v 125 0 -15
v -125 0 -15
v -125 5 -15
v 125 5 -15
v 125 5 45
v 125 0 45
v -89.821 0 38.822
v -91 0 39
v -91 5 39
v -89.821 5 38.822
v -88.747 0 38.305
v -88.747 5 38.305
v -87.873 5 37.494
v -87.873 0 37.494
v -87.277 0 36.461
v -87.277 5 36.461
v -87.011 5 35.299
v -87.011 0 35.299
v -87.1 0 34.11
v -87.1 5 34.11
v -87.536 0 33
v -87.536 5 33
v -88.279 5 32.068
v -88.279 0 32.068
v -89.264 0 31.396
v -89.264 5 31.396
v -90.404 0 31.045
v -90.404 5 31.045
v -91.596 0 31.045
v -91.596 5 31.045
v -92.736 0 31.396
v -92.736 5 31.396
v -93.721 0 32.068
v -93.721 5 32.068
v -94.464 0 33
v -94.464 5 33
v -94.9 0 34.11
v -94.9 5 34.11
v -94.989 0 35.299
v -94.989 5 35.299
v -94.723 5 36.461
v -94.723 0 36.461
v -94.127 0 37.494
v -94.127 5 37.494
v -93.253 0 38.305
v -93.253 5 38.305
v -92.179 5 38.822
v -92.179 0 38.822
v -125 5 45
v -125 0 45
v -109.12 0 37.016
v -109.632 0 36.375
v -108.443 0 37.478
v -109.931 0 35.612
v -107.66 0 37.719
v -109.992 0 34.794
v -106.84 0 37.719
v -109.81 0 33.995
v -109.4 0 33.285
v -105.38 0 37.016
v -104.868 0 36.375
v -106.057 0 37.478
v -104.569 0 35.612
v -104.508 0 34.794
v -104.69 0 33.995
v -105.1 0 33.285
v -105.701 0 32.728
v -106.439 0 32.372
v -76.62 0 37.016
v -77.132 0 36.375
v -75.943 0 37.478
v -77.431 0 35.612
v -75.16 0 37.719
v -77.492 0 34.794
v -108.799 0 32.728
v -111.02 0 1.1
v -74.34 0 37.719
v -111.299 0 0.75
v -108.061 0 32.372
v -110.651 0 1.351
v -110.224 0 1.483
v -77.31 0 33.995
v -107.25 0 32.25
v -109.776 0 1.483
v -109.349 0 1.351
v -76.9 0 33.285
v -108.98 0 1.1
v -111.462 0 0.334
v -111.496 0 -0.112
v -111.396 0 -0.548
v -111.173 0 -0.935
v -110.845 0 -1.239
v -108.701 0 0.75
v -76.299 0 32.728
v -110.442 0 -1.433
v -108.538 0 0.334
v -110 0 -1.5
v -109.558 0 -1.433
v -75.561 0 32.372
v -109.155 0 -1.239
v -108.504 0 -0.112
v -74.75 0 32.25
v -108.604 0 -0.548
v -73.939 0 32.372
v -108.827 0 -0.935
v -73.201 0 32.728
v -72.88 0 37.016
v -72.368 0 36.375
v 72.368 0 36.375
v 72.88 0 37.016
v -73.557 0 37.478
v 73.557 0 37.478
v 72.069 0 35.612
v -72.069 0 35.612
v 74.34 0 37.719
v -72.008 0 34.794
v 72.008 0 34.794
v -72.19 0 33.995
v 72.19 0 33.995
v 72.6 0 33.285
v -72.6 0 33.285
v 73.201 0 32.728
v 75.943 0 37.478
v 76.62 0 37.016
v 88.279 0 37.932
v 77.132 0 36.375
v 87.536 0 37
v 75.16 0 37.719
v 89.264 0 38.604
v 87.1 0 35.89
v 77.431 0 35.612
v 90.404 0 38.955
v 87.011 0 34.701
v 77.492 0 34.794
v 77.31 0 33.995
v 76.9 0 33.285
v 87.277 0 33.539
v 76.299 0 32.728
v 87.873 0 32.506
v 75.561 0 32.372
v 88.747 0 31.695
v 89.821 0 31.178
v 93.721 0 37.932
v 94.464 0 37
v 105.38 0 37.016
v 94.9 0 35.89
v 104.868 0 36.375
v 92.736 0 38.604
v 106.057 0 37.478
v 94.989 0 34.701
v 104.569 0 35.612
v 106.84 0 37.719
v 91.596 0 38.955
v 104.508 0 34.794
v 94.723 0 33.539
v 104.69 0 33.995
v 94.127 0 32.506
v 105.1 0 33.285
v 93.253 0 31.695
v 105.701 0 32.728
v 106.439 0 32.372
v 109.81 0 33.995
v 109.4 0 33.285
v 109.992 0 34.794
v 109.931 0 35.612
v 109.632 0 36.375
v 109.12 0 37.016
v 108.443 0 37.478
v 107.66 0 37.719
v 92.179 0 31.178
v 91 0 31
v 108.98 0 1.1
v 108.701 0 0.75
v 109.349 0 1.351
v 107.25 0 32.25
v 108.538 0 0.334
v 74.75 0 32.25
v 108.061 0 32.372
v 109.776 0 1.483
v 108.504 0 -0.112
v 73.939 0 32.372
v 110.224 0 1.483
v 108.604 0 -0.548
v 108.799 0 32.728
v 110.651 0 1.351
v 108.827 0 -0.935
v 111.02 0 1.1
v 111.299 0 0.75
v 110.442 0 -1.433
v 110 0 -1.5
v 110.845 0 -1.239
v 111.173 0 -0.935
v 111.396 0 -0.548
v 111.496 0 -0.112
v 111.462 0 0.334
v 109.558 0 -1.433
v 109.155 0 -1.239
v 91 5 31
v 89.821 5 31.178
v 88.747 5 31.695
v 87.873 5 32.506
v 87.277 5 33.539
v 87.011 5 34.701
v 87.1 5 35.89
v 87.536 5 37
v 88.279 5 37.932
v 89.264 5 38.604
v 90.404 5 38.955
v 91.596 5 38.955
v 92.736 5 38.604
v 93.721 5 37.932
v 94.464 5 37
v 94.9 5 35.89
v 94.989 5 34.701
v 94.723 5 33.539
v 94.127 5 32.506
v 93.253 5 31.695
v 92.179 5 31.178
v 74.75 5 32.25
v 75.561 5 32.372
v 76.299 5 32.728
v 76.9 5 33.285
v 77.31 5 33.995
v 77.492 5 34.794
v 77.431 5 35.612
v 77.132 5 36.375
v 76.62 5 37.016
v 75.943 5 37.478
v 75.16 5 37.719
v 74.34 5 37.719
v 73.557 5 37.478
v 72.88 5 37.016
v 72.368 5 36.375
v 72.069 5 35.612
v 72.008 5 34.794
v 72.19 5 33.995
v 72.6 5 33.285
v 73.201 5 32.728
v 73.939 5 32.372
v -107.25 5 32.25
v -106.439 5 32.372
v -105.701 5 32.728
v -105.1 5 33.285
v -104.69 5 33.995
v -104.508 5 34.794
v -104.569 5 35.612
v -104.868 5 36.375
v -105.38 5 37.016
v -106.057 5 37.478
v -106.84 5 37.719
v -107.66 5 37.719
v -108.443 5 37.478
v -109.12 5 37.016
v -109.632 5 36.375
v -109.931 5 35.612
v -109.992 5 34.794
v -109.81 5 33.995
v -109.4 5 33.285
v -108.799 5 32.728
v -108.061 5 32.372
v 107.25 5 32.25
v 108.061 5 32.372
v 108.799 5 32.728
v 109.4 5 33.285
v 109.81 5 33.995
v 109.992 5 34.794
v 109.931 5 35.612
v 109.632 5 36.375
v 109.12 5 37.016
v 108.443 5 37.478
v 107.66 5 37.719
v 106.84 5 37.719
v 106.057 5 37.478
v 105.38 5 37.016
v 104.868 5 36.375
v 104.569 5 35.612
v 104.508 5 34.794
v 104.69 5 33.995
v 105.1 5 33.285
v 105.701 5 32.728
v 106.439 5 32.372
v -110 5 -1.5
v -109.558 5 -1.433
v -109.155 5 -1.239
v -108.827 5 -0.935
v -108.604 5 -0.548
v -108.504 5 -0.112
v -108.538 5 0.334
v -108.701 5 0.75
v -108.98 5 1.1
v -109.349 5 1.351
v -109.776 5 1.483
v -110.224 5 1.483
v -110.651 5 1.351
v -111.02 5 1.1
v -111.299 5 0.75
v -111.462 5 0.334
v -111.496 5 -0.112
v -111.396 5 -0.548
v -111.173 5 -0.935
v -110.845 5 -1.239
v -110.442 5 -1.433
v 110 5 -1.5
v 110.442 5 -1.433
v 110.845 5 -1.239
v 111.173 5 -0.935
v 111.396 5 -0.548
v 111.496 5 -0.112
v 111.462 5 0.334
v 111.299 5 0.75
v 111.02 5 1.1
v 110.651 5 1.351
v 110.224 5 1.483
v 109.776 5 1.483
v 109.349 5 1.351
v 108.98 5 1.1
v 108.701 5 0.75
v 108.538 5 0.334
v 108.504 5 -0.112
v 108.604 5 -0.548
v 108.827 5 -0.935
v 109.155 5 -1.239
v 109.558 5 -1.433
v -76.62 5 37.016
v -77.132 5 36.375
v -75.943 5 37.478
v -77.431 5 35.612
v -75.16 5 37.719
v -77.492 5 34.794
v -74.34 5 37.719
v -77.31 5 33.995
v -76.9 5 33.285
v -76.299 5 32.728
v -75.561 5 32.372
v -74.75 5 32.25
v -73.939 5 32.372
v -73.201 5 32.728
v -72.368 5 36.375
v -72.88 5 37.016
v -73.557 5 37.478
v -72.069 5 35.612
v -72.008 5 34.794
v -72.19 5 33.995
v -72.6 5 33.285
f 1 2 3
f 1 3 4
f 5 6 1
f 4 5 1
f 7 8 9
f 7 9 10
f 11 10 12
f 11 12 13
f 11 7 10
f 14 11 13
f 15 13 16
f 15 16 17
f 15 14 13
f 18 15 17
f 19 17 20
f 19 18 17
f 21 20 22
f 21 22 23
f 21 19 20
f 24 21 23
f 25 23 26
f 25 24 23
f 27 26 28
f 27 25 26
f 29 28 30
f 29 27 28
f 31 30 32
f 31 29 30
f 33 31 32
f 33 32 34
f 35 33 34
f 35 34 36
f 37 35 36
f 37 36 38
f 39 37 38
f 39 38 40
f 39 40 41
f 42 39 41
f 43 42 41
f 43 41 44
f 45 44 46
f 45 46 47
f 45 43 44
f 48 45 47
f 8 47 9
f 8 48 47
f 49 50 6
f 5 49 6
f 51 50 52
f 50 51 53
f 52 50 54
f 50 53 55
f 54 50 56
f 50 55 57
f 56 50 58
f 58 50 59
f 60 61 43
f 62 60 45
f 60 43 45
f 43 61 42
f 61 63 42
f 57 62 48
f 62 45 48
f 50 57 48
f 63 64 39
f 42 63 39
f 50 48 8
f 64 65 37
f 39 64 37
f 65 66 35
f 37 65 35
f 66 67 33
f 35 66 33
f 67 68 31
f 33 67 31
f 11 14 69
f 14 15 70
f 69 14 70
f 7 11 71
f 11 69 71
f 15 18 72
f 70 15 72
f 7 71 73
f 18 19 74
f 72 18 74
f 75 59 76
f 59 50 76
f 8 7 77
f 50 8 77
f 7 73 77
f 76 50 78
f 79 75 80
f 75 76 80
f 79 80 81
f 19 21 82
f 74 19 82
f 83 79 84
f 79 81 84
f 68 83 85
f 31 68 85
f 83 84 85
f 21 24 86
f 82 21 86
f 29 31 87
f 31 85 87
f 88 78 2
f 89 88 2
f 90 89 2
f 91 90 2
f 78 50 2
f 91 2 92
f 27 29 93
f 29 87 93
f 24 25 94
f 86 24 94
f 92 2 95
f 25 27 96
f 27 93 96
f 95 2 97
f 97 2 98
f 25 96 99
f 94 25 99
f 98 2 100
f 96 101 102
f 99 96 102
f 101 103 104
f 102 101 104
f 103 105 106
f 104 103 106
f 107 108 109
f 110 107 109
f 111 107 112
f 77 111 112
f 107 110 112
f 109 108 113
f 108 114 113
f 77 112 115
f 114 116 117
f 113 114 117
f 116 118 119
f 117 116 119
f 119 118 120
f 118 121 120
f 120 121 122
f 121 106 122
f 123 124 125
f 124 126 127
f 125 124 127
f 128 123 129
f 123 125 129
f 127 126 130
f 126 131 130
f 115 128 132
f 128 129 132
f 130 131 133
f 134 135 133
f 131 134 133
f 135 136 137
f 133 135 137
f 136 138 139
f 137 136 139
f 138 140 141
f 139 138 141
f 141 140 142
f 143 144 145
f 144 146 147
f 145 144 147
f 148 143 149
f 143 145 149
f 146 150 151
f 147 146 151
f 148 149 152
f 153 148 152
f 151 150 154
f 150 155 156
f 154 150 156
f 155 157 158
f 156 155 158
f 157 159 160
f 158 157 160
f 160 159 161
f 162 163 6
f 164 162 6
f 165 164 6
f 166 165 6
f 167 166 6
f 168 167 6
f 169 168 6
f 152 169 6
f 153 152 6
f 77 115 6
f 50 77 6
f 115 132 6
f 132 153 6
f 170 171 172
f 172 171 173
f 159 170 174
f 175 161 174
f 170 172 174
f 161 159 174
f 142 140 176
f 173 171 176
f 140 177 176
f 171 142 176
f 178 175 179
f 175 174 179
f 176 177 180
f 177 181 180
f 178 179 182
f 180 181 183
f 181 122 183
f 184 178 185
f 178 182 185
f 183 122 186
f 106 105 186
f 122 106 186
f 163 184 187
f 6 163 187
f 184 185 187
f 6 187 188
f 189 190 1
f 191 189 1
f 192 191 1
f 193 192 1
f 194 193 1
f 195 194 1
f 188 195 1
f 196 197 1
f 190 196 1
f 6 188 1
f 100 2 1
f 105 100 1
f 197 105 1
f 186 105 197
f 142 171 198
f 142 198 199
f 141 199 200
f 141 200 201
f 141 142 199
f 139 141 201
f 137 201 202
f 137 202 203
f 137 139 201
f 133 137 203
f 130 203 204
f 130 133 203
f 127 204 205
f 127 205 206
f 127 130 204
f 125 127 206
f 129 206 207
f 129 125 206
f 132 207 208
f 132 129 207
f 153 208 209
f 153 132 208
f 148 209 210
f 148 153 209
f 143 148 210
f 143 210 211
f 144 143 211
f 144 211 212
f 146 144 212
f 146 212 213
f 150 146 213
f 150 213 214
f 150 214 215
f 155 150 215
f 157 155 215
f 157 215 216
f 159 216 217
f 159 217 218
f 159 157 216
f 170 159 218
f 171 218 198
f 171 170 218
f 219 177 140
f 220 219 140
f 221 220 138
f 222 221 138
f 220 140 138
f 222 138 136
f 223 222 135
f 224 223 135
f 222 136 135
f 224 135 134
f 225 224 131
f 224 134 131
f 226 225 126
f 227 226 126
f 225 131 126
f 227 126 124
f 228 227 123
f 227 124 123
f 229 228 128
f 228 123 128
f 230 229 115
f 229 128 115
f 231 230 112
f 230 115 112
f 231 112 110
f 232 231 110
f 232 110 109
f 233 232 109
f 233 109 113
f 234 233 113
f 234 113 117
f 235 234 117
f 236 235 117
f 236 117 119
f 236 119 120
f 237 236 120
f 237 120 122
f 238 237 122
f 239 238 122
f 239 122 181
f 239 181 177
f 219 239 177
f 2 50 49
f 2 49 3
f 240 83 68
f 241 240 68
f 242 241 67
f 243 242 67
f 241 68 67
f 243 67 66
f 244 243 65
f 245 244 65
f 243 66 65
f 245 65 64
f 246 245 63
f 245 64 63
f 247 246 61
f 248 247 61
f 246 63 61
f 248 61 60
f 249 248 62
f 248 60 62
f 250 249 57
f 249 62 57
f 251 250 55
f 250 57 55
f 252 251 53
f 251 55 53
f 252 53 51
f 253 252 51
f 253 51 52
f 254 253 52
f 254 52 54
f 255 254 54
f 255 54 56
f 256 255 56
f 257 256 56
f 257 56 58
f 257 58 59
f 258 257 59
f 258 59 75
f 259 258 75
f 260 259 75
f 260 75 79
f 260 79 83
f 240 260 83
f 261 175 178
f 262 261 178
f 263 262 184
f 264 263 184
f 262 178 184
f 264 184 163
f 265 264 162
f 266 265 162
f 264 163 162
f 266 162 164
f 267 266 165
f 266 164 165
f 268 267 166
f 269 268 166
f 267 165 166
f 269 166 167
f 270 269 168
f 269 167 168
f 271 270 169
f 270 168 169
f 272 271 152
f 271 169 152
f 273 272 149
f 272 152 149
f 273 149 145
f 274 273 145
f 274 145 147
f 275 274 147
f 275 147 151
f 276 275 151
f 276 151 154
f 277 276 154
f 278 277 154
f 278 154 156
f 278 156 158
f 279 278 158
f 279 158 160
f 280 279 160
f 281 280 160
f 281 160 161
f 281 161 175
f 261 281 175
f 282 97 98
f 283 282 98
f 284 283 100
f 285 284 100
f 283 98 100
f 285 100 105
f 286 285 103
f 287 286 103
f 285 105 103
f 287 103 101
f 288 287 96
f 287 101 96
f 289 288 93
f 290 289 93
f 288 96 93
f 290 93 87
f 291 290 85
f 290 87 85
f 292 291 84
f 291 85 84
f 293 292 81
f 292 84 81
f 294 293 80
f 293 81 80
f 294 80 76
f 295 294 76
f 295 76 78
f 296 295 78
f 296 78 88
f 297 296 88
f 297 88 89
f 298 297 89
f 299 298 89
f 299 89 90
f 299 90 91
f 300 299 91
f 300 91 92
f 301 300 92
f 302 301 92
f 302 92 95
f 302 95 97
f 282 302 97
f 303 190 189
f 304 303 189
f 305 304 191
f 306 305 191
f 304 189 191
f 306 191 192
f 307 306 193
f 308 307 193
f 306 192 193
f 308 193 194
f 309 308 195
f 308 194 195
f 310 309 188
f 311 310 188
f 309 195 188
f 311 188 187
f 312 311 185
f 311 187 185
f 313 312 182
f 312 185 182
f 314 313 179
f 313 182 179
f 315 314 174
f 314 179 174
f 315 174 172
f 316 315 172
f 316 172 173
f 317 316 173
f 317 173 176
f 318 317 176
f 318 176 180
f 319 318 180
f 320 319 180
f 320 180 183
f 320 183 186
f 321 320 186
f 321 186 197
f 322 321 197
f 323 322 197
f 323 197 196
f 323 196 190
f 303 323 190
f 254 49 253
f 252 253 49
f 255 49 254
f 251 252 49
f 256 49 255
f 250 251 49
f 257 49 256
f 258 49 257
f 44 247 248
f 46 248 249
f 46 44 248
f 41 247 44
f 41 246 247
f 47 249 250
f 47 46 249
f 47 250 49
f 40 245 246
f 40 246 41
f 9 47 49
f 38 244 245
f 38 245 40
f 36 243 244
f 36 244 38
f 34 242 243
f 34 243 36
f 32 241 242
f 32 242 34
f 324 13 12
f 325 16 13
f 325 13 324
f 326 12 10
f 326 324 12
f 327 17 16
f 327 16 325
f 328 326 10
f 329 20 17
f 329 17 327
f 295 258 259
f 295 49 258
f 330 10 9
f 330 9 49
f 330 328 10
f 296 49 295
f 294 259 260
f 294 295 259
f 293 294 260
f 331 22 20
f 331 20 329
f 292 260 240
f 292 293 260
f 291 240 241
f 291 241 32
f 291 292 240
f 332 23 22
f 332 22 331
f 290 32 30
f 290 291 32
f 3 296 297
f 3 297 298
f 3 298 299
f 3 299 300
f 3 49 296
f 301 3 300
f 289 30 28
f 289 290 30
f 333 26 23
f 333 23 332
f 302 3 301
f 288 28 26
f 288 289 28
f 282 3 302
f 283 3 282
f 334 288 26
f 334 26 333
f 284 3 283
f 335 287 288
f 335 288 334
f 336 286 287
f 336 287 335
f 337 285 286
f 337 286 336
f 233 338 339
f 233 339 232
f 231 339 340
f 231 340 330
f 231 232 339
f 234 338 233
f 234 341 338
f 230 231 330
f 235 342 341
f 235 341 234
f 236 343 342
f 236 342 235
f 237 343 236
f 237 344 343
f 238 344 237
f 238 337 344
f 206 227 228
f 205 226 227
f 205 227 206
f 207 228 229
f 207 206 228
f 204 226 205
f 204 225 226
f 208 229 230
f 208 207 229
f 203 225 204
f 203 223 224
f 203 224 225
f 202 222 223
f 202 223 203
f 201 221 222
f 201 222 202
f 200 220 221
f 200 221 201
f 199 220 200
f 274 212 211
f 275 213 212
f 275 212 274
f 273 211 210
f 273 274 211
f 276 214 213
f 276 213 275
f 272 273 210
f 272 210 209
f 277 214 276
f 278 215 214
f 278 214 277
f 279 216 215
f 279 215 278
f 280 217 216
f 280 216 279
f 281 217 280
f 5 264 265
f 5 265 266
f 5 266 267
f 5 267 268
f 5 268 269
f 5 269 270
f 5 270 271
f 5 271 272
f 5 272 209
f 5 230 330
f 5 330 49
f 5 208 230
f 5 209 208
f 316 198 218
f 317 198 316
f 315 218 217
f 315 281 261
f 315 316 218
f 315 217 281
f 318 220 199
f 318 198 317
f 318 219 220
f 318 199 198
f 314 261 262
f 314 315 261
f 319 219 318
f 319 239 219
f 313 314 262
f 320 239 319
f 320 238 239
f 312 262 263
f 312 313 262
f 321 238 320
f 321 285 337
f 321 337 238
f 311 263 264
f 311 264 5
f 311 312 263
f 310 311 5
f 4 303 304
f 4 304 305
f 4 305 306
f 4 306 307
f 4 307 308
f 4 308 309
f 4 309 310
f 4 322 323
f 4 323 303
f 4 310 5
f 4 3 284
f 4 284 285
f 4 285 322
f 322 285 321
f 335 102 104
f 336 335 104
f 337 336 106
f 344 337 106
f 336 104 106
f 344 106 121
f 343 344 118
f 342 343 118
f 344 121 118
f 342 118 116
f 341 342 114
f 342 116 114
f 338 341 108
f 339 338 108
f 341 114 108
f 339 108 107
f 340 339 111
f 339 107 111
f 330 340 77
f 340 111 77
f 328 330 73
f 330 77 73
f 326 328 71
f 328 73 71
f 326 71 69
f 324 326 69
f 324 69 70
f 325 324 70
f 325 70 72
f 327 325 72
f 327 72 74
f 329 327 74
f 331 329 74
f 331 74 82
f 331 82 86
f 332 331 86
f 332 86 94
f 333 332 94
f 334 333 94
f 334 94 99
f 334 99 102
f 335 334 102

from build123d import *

# Parameters (mm, degrees)
SKETCH1_W           = 250
SKETCH1_H           = 60
SKETCH1_R           = 4
BOSS_EXTRUDE1_DEPTH = 5
SKETCH2_R           = 1.5
SKETCH2_R_2         = 2.75
CUT_EXTRUDE1_DEPTH  = 10


with BuildPart() as part:
    # Sketch1 → Boss-Extrude1 (new body)
    with BuildSketch(Plane(origin=(0, 0, 0), x_dir=(1, 0, 0), z_dir=(0, 1, 0))):
        with Locations((0, -15)):
            Rectangle(SKETCH1_W, SKETCH1_H)
        with Locations(Location((-91, -35, 0), (0, 0, 270))):
            Circle(SKETCH1_R, mode=Mode.SUBTRACT)
        with Locations(Location((91, -35, 0), (0, 0, 90))):
            Circle(SKETCH1_R, mode=Mode.SUBTRACT)
    extrude(amount=BOSS_EXTRUDE1_DEPTH)

    # Sketch2 → Cut-Extrude1 (cut)
    with BuildSketch(Plane.XZ):
        with Locations(Location((110, 0, 0), (0, 0, 270))):
            Circle(SKETCH2_R)
        with Locations(Location((74.75, 35, 0), (0, 0, 270))):
            Circle(SKETCH2_R_2)
        with Locations(Location((107.25, 35, 0), (0, 0, 270))):
            Circle(SKETCH2_R_2)
        with Locations(Location((-110, 0, 0), (0, 0, 270))):
            Circle(SKETCH2_R)
        with Locations(Location((-74.75, 35, 0), (0, 0, 270))):
            Circle(SKETCH2_R_2)
        with Locations(Location((-107.25, 35, 0), (0, 0, 270))):
            Circle(SKETCH2_R_2)
    extrude(amount=-CUT_EXTRUDE1_DEPTH, mode=Mode.SUBTRACT)


solid = part.part
